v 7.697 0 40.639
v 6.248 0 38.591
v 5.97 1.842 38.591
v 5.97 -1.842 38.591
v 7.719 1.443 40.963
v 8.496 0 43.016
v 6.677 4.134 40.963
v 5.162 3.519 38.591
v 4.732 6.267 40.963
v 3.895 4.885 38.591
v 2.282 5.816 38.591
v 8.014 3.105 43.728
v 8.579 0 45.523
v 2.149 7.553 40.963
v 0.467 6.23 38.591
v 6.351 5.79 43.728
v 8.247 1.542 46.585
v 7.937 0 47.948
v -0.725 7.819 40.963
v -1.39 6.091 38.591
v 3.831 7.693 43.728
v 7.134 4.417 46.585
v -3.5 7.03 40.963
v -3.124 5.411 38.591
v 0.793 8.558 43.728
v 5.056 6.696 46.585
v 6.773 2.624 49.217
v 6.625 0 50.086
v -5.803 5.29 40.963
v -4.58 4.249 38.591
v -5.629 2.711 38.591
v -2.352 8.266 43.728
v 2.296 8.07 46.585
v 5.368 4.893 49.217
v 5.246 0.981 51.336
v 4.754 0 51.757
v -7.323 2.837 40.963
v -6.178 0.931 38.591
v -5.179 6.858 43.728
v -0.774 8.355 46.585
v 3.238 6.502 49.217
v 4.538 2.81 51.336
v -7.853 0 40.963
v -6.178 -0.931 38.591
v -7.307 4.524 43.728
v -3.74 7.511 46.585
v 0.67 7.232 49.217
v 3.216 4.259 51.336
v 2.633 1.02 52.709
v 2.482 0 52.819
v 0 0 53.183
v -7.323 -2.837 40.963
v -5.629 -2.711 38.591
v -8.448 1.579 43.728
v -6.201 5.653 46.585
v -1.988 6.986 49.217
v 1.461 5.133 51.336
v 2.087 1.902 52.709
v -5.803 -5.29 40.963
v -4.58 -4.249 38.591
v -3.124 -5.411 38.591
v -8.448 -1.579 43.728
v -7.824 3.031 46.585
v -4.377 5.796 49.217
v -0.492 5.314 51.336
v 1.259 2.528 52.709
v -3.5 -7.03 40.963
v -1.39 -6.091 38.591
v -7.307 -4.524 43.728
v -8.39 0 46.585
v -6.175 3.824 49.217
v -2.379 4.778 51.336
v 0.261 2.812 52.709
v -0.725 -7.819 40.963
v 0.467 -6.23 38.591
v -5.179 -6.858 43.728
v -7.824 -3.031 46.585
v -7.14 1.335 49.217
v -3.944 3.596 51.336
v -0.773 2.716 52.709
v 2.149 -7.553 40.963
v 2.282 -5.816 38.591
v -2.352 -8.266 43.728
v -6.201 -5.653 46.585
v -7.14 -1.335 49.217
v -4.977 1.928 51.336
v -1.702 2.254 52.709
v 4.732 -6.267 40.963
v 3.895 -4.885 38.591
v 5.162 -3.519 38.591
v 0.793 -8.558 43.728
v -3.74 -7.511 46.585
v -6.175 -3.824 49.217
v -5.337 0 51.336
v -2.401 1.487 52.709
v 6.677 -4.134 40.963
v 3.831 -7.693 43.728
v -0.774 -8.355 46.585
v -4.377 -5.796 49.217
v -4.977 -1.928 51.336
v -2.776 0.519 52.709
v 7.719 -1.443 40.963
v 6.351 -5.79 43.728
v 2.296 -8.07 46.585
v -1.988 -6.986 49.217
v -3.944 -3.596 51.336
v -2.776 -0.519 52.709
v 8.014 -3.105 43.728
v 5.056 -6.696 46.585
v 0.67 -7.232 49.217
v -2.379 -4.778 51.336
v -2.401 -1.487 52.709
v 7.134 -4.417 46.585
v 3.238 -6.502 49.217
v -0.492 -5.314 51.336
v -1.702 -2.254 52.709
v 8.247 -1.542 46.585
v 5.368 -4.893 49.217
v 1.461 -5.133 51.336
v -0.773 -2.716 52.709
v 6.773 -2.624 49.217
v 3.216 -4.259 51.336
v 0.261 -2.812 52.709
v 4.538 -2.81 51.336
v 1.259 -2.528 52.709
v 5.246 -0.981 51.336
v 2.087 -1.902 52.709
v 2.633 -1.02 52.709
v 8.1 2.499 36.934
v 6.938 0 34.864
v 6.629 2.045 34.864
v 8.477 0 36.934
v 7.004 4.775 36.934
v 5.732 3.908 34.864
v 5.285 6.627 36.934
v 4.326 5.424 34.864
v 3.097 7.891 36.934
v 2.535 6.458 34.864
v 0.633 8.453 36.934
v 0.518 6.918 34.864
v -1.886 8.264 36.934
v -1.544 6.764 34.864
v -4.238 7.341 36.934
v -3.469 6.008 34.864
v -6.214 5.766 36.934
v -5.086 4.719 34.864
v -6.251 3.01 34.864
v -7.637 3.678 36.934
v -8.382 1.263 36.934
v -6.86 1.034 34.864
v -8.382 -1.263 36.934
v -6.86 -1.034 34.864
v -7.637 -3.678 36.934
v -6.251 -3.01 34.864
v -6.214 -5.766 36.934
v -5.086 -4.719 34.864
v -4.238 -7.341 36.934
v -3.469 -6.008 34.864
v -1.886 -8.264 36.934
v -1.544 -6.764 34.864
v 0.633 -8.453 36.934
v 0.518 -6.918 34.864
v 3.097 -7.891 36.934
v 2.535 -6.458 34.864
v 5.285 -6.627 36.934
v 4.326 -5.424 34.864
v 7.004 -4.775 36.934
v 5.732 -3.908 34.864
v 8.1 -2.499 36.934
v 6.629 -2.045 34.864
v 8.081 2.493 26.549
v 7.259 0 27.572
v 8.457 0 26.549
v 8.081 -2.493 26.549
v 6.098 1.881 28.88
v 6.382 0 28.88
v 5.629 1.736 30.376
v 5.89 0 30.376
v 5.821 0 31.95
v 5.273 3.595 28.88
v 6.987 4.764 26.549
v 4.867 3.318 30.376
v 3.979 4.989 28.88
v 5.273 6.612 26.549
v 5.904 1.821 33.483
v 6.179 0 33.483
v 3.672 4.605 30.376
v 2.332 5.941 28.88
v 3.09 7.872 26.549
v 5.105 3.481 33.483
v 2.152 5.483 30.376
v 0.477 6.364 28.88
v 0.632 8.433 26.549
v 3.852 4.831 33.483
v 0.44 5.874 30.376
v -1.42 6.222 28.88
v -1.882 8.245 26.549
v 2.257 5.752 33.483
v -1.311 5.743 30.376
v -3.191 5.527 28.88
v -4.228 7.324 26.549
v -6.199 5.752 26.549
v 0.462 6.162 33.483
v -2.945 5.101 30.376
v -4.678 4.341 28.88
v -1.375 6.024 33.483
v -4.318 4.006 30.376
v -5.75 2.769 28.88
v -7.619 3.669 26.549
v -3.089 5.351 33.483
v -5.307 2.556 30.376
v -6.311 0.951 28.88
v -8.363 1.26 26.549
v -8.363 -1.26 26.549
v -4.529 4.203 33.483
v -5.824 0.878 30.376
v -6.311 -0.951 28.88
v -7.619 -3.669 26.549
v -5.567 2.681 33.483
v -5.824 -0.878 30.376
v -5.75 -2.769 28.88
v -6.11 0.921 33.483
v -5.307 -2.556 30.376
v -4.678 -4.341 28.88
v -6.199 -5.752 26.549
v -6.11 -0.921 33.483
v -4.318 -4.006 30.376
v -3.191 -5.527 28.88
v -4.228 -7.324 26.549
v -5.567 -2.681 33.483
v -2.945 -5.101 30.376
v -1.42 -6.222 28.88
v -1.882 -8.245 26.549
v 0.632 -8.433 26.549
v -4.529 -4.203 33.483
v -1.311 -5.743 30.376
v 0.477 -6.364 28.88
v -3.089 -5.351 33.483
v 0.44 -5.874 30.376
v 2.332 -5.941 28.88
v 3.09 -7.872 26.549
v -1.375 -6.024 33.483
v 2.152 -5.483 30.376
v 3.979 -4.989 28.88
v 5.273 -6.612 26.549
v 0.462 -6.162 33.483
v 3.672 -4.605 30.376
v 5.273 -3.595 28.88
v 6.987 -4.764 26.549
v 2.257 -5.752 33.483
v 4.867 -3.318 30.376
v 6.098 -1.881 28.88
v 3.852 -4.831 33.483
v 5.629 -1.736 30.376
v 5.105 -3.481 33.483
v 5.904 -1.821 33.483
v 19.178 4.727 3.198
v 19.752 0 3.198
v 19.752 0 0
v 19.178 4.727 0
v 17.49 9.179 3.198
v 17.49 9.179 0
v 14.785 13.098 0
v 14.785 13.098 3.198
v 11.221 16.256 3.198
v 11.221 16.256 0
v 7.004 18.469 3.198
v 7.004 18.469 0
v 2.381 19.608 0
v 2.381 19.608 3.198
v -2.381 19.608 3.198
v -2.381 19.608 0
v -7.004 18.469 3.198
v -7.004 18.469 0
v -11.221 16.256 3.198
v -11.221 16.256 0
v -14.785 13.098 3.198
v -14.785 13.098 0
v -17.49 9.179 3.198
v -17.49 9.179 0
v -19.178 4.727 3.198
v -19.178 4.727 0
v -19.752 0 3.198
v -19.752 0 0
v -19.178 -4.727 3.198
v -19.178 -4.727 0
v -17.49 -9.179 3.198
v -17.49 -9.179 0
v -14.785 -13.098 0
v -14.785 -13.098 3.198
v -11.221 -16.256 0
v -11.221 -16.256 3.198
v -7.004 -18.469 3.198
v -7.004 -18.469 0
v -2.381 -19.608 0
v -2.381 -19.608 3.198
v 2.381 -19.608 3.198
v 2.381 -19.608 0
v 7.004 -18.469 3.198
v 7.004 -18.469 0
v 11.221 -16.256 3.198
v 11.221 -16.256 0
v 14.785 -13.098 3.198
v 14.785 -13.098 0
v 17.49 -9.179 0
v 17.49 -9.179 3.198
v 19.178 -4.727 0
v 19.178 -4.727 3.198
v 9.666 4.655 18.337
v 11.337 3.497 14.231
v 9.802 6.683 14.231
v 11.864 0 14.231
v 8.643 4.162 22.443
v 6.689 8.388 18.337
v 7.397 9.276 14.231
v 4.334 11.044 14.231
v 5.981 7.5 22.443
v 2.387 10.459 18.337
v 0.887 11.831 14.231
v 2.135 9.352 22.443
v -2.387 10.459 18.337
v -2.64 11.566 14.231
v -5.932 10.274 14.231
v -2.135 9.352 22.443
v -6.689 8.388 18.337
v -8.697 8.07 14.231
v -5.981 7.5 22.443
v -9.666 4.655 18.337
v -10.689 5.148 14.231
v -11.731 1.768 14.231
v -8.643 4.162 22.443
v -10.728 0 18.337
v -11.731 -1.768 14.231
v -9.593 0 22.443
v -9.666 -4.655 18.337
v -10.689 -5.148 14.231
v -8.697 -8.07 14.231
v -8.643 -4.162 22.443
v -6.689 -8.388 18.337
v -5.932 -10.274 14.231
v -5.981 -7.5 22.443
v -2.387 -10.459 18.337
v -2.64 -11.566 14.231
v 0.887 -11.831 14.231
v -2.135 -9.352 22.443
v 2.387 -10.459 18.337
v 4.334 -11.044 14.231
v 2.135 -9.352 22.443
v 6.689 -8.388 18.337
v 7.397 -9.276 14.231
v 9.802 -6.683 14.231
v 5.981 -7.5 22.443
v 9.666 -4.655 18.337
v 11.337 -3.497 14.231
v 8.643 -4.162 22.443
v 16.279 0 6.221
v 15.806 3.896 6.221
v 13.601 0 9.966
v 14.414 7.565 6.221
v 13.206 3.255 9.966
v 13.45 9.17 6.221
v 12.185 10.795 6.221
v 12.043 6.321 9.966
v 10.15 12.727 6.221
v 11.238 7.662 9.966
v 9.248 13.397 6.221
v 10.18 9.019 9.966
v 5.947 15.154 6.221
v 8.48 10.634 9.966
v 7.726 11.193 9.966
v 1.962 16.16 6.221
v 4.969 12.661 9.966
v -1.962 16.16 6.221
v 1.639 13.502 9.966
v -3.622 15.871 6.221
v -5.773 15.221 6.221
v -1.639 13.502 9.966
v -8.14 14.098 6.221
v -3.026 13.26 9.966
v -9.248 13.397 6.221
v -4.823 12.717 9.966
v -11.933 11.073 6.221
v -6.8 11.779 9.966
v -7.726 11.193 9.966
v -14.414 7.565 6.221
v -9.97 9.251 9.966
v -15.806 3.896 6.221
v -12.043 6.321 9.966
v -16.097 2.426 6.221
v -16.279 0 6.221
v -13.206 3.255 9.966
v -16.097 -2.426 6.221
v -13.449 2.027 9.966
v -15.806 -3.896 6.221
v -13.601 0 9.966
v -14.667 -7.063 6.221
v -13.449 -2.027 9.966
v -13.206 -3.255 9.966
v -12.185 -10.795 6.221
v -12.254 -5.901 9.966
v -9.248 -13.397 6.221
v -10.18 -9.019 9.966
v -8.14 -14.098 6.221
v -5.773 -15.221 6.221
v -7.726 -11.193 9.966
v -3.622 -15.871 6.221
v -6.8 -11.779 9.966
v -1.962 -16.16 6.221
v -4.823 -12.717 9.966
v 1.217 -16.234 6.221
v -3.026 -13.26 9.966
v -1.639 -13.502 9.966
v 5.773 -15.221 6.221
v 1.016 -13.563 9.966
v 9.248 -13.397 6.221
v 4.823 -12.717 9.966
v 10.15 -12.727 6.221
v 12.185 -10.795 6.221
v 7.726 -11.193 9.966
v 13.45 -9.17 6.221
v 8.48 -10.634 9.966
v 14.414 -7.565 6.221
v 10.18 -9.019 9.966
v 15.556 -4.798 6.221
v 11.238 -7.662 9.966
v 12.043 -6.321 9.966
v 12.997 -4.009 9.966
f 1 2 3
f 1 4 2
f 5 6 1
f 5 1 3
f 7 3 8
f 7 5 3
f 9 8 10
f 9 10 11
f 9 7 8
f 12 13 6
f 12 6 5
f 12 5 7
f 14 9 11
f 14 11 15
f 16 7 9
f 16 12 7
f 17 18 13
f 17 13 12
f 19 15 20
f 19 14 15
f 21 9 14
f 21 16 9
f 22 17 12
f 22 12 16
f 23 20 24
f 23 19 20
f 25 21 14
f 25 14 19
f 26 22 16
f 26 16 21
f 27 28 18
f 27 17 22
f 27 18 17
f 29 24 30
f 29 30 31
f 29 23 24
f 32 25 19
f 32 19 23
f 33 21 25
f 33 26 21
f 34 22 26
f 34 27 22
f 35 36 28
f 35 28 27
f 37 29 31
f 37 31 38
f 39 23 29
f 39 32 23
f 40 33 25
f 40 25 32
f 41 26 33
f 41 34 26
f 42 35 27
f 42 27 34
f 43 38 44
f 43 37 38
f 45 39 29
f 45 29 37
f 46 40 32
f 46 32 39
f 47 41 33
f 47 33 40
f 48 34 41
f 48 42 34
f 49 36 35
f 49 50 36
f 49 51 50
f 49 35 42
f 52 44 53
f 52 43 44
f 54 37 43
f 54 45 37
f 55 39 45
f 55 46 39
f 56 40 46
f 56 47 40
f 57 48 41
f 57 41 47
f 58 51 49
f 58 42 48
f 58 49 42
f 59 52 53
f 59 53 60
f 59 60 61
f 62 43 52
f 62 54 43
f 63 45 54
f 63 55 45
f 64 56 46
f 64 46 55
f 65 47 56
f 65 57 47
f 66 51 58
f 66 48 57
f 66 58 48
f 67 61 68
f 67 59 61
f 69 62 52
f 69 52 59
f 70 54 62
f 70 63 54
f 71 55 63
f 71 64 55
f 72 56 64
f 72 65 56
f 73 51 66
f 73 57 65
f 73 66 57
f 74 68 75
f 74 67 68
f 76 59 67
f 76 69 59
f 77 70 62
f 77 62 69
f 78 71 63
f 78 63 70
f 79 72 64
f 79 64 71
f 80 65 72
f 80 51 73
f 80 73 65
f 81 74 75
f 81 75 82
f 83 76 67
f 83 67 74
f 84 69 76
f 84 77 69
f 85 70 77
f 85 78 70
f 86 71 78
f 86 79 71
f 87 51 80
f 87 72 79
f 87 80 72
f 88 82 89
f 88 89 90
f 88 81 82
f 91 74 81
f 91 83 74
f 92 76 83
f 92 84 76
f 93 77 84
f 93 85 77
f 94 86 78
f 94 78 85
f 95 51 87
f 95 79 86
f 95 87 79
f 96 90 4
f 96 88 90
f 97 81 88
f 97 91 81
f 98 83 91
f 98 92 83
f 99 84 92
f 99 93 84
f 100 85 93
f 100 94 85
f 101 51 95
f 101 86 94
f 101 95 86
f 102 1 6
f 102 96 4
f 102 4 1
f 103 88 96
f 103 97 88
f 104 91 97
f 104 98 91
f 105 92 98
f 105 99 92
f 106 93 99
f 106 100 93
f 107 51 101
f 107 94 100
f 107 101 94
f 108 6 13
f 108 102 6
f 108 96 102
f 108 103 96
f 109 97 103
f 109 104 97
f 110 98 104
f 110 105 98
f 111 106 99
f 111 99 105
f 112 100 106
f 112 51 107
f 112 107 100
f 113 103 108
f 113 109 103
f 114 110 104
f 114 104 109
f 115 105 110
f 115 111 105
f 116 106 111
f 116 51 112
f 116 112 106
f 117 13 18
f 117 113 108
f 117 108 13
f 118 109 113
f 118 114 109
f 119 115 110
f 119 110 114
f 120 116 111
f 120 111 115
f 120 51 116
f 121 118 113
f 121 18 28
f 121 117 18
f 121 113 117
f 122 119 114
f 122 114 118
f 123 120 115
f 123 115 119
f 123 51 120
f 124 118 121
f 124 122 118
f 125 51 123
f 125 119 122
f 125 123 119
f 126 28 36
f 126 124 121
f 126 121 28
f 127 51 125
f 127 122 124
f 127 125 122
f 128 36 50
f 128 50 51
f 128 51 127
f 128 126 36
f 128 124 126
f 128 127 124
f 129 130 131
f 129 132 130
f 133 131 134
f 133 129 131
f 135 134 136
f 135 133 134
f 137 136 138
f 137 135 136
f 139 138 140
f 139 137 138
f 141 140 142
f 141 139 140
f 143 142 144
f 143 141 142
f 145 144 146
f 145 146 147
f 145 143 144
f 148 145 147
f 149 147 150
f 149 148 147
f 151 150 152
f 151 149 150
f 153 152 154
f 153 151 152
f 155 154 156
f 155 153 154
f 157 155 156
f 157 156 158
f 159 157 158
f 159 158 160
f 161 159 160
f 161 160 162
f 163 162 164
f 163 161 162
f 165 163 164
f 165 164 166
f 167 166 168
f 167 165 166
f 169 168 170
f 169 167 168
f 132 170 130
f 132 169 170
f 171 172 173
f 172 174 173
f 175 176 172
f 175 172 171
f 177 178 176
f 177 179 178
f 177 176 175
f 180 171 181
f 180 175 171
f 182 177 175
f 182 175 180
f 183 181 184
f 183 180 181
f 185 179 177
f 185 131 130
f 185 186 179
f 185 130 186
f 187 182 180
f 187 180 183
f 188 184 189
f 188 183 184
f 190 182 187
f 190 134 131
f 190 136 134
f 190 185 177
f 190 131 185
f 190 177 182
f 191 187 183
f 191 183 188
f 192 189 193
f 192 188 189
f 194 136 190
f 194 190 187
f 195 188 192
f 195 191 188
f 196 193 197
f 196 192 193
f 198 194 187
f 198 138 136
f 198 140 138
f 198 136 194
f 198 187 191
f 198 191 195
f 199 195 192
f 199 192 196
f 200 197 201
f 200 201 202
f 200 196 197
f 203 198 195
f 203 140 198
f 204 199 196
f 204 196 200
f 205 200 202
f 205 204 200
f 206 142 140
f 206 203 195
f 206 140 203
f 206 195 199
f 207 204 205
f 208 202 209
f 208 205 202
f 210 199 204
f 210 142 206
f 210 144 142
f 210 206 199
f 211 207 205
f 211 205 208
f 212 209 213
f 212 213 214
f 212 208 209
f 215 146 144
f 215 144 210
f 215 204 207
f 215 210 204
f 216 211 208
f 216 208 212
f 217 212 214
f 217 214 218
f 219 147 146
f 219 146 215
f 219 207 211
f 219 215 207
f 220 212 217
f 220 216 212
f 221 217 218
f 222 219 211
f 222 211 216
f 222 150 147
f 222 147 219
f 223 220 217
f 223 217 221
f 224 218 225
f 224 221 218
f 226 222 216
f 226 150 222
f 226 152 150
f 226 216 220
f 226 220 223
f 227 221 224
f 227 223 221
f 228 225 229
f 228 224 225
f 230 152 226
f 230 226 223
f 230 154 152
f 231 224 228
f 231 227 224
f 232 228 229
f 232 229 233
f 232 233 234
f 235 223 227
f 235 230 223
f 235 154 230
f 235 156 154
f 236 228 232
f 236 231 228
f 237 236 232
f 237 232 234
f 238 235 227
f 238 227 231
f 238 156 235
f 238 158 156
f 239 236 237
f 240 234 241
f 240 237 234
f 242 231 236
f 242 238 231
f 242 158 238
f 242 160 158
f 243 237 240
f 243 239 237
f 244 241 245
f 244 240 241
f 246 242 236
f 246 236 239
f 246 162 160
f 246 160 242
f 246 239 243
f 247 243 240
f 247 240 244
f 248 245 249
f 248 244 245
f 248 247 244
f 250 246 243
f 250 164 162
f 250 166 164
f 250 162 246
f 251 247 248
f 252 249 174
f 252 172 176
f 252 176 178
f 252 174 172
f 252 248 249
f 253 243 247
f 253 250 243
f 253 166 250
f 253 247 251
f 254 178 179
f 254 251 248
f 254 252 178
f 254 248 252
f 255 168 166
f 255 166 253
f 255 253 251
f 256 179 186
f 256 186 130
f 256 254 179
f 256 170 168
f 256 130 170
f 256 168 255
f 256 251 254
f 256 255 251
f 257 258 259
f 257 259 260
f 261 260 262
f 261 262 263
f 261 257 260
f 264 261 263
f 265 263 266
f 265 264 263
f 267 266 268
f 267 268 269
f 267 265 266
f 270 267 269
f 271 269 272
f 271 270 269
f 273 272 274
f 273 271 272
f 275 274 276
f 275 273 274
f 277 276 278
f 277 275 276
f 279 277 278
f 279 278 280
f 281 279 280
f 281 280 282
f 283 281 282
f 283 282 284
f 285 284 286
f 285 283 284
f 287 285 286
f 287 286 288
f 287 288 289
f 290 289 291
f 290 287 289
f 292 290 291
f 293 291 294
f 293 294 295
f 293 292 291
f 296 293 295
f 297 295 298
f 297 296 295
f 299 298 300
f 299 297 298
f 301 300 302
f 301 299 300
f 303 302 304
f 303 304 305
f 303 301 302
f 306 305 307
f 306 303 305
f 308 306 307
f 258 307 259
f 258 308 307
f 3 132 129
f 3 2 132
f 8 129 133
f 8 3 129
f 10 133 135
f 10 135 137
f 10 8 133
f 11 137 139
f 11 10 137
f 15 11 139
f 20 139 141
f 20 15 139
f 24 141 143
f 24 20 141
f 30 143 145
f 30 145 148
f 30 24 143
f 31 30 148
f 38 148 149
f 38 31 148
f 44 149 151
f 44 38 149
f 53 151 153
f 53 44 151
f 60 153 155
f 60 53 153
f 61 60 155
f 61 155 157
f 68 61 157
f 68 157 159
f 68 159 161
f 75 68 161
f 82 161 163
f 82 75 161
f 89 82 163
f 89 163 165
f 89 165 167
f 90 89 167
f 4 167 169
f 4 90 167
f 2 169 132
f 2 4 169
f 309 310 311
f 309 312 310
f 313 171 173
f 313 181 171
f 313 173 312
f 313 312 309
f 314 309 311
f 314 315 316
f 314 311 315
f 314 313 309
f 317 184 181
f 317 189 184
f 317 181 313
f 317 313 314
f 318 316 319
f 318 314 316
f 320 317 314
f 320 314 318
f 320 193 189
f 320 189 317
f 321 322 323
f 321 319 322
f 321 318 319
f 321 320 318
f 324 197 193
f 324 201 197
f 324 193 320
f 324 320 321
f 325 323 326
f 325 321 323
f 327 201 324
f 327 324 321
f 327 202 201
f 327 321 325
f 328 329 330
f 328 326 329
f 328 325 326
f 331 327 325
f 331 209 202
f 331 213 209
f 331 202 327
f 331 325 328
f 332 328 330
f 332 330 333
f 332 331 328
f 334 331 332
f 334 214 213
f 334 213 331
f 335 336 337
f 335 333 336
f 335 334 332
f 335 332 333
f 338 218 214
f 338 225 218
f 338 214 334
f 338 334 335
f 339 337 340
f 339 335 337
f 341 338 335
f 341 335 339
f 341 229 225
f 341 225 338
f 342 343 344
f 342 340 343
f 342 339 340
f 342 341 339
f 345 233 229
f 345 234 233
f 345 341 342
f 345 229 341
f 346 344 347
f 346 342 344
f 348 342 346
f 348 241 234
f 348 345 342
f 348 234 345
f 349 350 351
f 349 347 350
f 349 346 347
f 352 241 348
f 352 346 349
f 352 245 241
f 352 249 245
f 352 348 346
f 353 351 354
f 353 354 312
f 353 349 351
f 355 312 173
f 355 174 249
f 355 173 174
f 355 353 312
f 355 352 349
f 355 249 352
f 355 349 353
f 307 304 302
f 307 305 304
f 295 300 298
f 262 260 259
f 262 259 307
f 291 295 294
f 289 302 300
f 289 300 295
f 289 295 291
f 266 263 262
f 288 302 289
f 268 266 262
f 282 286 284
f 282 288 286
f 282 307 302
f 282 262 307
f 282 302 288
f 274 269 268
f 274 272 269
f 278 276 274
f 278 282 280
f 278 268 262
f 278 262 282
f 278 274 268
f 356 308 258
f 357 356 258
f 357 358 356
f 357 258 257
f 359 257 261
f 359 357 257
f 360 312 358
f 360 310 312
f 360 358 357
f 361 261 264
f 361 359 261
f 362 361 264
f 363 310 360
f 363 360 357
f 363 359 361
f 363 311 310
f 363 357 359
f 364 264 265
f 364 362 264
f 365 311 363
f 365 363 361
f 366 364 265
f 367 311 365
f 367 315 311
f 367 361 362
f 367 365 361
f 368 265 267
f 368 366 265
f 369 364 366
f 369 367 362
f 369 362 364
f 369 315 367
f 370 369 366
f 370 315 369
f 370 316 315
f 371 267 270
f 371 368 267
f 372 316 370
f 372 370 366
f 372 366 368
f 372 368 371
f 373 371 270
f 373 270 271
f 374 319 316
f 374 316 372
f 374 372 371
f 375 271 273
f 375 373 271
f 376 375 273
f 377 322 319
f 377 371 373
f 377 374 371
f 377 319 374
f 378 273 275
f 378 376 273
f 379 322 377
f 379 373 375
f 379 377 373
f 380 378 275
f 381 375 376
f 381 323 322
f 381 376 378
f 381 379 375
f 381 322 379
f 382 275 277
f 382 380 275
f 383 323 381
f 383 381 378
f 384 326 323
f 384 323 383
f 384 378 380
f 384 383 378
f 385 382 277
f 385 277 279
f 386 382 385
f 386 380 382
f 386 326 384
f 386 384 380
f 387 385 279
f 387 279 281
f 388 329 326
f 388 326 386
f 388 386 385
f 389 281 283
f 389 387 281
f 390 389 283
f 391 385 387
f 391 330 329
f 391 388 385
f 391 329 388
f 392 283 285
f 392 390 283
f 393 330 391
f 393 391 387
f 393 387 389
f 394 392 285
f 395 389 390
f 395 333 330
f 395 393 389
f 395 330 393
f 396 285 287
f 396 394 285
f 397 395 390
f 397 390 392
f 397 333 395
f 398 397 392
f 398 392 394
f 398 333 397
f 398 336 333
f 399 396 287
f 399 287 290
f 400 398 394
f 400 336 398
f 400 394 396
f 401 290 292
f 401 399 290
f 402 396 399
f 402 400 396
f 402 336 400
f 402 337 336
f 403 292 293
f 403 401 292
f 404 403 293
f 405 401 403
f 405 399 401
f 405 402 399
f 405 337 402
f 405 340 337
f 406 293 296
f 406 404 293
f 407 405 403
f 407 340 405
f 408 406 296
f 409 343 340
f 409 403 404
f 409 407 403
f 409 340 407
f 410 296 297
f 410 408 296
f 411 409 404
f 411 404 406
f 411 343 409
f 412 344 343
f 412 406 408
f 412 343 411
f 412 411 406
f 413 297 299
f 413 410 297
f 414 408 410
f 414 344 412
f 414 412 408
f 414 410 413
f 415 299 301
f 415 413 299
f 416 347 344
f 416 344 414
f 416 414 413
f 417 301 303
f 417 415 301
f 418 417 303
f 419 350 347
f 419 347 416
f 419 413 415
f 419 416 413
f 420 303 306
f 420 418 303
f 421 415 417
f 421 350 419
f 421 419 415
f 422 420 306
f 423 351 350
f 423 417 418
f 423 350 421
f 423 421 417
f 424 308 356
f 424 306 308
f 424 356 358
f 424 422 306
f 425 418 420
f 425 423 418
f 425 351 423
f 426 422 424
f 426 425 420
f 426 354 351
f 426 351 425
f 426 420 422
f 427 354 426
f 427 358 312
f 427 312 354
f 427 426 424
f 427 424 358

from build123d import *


# Not quite as in the source:
# - a fillet or chamfer that OpenCascade refuses, or shapes differently, is made with other operations: its cross-section is extruded or revolved along the edge and cut away or added


with BuildPart() as f1:
    # F0 (on Front) → F1 (revolve)
    with BuildSketch(Plane.XZ):
        with BuildLine():
            Line((0, 38.5912625485), (0, 0))
            Line((0, 0), (19.7524651885, 0))
            Line((19.7524651885, 0), (19.7524651885, 3.1980082858))
            Line((19.7524651885, 3.1980082858), (14.1919255257, 5.8136251755))
            Line((14.1919255257, 5.8136251755), (8.4569835516, 26.5488596043))
            ThreePointArc((8.4569835516, 26.5488596043), (5.8902046524, 30.3760769017), (6.9375761897, 34.8637220549))
            Line((6.9375761897, 34.8637220549), (8.4767341614, 36.9339473546))
            Line((8.4767341614, 36.9339473546), (6.2475829585, 38.5912625485))
            ThreePointArc((6.2475829585, 38.5912625485), (7.9366897799, 47.9479775999), (0, 53.183448328))
            Line((0, 53.183448328), (0, 38.5912625485))
        make_face()
    revolve(axis=Axis((0, 0, 19.2956312742), (0, 0, 1)))

    # F2: fillet of radius 19.7282149364 on 1 edges, made by hand

    # F2_s1 → F2_t2 (revolve)
    with BuildSketch(Plane.XZ):
        with BuildLine():
            ThreePointArc((19.7524651885, 3.1980082858), (14.8303095618, 8.0151476836), (11.8639351327, 14.2306984022))
            Line((11.8639351327, 14.2306984022), (11.4836480923, 14.1255187807))
            Line((11.4836480923, 14.1255187807), (13.8116384853, 5.708445554))
            Line((13.8116384853, 5.708445554), (14.0239794459, 5.4565886226))
            ThreePointArc((14.0239794459, 5.4565886226), (16.8042492773, 4.1487801778), (19.5299487493, 2.872174862))
            Line((19.5299487493, 2.872174862), (19.7524651885, 3.1980082858))
        make_face()
    revolve(axis=Axis((0, 0, 5.8136251755), (0, 0, 1)))


solid = f1.part
